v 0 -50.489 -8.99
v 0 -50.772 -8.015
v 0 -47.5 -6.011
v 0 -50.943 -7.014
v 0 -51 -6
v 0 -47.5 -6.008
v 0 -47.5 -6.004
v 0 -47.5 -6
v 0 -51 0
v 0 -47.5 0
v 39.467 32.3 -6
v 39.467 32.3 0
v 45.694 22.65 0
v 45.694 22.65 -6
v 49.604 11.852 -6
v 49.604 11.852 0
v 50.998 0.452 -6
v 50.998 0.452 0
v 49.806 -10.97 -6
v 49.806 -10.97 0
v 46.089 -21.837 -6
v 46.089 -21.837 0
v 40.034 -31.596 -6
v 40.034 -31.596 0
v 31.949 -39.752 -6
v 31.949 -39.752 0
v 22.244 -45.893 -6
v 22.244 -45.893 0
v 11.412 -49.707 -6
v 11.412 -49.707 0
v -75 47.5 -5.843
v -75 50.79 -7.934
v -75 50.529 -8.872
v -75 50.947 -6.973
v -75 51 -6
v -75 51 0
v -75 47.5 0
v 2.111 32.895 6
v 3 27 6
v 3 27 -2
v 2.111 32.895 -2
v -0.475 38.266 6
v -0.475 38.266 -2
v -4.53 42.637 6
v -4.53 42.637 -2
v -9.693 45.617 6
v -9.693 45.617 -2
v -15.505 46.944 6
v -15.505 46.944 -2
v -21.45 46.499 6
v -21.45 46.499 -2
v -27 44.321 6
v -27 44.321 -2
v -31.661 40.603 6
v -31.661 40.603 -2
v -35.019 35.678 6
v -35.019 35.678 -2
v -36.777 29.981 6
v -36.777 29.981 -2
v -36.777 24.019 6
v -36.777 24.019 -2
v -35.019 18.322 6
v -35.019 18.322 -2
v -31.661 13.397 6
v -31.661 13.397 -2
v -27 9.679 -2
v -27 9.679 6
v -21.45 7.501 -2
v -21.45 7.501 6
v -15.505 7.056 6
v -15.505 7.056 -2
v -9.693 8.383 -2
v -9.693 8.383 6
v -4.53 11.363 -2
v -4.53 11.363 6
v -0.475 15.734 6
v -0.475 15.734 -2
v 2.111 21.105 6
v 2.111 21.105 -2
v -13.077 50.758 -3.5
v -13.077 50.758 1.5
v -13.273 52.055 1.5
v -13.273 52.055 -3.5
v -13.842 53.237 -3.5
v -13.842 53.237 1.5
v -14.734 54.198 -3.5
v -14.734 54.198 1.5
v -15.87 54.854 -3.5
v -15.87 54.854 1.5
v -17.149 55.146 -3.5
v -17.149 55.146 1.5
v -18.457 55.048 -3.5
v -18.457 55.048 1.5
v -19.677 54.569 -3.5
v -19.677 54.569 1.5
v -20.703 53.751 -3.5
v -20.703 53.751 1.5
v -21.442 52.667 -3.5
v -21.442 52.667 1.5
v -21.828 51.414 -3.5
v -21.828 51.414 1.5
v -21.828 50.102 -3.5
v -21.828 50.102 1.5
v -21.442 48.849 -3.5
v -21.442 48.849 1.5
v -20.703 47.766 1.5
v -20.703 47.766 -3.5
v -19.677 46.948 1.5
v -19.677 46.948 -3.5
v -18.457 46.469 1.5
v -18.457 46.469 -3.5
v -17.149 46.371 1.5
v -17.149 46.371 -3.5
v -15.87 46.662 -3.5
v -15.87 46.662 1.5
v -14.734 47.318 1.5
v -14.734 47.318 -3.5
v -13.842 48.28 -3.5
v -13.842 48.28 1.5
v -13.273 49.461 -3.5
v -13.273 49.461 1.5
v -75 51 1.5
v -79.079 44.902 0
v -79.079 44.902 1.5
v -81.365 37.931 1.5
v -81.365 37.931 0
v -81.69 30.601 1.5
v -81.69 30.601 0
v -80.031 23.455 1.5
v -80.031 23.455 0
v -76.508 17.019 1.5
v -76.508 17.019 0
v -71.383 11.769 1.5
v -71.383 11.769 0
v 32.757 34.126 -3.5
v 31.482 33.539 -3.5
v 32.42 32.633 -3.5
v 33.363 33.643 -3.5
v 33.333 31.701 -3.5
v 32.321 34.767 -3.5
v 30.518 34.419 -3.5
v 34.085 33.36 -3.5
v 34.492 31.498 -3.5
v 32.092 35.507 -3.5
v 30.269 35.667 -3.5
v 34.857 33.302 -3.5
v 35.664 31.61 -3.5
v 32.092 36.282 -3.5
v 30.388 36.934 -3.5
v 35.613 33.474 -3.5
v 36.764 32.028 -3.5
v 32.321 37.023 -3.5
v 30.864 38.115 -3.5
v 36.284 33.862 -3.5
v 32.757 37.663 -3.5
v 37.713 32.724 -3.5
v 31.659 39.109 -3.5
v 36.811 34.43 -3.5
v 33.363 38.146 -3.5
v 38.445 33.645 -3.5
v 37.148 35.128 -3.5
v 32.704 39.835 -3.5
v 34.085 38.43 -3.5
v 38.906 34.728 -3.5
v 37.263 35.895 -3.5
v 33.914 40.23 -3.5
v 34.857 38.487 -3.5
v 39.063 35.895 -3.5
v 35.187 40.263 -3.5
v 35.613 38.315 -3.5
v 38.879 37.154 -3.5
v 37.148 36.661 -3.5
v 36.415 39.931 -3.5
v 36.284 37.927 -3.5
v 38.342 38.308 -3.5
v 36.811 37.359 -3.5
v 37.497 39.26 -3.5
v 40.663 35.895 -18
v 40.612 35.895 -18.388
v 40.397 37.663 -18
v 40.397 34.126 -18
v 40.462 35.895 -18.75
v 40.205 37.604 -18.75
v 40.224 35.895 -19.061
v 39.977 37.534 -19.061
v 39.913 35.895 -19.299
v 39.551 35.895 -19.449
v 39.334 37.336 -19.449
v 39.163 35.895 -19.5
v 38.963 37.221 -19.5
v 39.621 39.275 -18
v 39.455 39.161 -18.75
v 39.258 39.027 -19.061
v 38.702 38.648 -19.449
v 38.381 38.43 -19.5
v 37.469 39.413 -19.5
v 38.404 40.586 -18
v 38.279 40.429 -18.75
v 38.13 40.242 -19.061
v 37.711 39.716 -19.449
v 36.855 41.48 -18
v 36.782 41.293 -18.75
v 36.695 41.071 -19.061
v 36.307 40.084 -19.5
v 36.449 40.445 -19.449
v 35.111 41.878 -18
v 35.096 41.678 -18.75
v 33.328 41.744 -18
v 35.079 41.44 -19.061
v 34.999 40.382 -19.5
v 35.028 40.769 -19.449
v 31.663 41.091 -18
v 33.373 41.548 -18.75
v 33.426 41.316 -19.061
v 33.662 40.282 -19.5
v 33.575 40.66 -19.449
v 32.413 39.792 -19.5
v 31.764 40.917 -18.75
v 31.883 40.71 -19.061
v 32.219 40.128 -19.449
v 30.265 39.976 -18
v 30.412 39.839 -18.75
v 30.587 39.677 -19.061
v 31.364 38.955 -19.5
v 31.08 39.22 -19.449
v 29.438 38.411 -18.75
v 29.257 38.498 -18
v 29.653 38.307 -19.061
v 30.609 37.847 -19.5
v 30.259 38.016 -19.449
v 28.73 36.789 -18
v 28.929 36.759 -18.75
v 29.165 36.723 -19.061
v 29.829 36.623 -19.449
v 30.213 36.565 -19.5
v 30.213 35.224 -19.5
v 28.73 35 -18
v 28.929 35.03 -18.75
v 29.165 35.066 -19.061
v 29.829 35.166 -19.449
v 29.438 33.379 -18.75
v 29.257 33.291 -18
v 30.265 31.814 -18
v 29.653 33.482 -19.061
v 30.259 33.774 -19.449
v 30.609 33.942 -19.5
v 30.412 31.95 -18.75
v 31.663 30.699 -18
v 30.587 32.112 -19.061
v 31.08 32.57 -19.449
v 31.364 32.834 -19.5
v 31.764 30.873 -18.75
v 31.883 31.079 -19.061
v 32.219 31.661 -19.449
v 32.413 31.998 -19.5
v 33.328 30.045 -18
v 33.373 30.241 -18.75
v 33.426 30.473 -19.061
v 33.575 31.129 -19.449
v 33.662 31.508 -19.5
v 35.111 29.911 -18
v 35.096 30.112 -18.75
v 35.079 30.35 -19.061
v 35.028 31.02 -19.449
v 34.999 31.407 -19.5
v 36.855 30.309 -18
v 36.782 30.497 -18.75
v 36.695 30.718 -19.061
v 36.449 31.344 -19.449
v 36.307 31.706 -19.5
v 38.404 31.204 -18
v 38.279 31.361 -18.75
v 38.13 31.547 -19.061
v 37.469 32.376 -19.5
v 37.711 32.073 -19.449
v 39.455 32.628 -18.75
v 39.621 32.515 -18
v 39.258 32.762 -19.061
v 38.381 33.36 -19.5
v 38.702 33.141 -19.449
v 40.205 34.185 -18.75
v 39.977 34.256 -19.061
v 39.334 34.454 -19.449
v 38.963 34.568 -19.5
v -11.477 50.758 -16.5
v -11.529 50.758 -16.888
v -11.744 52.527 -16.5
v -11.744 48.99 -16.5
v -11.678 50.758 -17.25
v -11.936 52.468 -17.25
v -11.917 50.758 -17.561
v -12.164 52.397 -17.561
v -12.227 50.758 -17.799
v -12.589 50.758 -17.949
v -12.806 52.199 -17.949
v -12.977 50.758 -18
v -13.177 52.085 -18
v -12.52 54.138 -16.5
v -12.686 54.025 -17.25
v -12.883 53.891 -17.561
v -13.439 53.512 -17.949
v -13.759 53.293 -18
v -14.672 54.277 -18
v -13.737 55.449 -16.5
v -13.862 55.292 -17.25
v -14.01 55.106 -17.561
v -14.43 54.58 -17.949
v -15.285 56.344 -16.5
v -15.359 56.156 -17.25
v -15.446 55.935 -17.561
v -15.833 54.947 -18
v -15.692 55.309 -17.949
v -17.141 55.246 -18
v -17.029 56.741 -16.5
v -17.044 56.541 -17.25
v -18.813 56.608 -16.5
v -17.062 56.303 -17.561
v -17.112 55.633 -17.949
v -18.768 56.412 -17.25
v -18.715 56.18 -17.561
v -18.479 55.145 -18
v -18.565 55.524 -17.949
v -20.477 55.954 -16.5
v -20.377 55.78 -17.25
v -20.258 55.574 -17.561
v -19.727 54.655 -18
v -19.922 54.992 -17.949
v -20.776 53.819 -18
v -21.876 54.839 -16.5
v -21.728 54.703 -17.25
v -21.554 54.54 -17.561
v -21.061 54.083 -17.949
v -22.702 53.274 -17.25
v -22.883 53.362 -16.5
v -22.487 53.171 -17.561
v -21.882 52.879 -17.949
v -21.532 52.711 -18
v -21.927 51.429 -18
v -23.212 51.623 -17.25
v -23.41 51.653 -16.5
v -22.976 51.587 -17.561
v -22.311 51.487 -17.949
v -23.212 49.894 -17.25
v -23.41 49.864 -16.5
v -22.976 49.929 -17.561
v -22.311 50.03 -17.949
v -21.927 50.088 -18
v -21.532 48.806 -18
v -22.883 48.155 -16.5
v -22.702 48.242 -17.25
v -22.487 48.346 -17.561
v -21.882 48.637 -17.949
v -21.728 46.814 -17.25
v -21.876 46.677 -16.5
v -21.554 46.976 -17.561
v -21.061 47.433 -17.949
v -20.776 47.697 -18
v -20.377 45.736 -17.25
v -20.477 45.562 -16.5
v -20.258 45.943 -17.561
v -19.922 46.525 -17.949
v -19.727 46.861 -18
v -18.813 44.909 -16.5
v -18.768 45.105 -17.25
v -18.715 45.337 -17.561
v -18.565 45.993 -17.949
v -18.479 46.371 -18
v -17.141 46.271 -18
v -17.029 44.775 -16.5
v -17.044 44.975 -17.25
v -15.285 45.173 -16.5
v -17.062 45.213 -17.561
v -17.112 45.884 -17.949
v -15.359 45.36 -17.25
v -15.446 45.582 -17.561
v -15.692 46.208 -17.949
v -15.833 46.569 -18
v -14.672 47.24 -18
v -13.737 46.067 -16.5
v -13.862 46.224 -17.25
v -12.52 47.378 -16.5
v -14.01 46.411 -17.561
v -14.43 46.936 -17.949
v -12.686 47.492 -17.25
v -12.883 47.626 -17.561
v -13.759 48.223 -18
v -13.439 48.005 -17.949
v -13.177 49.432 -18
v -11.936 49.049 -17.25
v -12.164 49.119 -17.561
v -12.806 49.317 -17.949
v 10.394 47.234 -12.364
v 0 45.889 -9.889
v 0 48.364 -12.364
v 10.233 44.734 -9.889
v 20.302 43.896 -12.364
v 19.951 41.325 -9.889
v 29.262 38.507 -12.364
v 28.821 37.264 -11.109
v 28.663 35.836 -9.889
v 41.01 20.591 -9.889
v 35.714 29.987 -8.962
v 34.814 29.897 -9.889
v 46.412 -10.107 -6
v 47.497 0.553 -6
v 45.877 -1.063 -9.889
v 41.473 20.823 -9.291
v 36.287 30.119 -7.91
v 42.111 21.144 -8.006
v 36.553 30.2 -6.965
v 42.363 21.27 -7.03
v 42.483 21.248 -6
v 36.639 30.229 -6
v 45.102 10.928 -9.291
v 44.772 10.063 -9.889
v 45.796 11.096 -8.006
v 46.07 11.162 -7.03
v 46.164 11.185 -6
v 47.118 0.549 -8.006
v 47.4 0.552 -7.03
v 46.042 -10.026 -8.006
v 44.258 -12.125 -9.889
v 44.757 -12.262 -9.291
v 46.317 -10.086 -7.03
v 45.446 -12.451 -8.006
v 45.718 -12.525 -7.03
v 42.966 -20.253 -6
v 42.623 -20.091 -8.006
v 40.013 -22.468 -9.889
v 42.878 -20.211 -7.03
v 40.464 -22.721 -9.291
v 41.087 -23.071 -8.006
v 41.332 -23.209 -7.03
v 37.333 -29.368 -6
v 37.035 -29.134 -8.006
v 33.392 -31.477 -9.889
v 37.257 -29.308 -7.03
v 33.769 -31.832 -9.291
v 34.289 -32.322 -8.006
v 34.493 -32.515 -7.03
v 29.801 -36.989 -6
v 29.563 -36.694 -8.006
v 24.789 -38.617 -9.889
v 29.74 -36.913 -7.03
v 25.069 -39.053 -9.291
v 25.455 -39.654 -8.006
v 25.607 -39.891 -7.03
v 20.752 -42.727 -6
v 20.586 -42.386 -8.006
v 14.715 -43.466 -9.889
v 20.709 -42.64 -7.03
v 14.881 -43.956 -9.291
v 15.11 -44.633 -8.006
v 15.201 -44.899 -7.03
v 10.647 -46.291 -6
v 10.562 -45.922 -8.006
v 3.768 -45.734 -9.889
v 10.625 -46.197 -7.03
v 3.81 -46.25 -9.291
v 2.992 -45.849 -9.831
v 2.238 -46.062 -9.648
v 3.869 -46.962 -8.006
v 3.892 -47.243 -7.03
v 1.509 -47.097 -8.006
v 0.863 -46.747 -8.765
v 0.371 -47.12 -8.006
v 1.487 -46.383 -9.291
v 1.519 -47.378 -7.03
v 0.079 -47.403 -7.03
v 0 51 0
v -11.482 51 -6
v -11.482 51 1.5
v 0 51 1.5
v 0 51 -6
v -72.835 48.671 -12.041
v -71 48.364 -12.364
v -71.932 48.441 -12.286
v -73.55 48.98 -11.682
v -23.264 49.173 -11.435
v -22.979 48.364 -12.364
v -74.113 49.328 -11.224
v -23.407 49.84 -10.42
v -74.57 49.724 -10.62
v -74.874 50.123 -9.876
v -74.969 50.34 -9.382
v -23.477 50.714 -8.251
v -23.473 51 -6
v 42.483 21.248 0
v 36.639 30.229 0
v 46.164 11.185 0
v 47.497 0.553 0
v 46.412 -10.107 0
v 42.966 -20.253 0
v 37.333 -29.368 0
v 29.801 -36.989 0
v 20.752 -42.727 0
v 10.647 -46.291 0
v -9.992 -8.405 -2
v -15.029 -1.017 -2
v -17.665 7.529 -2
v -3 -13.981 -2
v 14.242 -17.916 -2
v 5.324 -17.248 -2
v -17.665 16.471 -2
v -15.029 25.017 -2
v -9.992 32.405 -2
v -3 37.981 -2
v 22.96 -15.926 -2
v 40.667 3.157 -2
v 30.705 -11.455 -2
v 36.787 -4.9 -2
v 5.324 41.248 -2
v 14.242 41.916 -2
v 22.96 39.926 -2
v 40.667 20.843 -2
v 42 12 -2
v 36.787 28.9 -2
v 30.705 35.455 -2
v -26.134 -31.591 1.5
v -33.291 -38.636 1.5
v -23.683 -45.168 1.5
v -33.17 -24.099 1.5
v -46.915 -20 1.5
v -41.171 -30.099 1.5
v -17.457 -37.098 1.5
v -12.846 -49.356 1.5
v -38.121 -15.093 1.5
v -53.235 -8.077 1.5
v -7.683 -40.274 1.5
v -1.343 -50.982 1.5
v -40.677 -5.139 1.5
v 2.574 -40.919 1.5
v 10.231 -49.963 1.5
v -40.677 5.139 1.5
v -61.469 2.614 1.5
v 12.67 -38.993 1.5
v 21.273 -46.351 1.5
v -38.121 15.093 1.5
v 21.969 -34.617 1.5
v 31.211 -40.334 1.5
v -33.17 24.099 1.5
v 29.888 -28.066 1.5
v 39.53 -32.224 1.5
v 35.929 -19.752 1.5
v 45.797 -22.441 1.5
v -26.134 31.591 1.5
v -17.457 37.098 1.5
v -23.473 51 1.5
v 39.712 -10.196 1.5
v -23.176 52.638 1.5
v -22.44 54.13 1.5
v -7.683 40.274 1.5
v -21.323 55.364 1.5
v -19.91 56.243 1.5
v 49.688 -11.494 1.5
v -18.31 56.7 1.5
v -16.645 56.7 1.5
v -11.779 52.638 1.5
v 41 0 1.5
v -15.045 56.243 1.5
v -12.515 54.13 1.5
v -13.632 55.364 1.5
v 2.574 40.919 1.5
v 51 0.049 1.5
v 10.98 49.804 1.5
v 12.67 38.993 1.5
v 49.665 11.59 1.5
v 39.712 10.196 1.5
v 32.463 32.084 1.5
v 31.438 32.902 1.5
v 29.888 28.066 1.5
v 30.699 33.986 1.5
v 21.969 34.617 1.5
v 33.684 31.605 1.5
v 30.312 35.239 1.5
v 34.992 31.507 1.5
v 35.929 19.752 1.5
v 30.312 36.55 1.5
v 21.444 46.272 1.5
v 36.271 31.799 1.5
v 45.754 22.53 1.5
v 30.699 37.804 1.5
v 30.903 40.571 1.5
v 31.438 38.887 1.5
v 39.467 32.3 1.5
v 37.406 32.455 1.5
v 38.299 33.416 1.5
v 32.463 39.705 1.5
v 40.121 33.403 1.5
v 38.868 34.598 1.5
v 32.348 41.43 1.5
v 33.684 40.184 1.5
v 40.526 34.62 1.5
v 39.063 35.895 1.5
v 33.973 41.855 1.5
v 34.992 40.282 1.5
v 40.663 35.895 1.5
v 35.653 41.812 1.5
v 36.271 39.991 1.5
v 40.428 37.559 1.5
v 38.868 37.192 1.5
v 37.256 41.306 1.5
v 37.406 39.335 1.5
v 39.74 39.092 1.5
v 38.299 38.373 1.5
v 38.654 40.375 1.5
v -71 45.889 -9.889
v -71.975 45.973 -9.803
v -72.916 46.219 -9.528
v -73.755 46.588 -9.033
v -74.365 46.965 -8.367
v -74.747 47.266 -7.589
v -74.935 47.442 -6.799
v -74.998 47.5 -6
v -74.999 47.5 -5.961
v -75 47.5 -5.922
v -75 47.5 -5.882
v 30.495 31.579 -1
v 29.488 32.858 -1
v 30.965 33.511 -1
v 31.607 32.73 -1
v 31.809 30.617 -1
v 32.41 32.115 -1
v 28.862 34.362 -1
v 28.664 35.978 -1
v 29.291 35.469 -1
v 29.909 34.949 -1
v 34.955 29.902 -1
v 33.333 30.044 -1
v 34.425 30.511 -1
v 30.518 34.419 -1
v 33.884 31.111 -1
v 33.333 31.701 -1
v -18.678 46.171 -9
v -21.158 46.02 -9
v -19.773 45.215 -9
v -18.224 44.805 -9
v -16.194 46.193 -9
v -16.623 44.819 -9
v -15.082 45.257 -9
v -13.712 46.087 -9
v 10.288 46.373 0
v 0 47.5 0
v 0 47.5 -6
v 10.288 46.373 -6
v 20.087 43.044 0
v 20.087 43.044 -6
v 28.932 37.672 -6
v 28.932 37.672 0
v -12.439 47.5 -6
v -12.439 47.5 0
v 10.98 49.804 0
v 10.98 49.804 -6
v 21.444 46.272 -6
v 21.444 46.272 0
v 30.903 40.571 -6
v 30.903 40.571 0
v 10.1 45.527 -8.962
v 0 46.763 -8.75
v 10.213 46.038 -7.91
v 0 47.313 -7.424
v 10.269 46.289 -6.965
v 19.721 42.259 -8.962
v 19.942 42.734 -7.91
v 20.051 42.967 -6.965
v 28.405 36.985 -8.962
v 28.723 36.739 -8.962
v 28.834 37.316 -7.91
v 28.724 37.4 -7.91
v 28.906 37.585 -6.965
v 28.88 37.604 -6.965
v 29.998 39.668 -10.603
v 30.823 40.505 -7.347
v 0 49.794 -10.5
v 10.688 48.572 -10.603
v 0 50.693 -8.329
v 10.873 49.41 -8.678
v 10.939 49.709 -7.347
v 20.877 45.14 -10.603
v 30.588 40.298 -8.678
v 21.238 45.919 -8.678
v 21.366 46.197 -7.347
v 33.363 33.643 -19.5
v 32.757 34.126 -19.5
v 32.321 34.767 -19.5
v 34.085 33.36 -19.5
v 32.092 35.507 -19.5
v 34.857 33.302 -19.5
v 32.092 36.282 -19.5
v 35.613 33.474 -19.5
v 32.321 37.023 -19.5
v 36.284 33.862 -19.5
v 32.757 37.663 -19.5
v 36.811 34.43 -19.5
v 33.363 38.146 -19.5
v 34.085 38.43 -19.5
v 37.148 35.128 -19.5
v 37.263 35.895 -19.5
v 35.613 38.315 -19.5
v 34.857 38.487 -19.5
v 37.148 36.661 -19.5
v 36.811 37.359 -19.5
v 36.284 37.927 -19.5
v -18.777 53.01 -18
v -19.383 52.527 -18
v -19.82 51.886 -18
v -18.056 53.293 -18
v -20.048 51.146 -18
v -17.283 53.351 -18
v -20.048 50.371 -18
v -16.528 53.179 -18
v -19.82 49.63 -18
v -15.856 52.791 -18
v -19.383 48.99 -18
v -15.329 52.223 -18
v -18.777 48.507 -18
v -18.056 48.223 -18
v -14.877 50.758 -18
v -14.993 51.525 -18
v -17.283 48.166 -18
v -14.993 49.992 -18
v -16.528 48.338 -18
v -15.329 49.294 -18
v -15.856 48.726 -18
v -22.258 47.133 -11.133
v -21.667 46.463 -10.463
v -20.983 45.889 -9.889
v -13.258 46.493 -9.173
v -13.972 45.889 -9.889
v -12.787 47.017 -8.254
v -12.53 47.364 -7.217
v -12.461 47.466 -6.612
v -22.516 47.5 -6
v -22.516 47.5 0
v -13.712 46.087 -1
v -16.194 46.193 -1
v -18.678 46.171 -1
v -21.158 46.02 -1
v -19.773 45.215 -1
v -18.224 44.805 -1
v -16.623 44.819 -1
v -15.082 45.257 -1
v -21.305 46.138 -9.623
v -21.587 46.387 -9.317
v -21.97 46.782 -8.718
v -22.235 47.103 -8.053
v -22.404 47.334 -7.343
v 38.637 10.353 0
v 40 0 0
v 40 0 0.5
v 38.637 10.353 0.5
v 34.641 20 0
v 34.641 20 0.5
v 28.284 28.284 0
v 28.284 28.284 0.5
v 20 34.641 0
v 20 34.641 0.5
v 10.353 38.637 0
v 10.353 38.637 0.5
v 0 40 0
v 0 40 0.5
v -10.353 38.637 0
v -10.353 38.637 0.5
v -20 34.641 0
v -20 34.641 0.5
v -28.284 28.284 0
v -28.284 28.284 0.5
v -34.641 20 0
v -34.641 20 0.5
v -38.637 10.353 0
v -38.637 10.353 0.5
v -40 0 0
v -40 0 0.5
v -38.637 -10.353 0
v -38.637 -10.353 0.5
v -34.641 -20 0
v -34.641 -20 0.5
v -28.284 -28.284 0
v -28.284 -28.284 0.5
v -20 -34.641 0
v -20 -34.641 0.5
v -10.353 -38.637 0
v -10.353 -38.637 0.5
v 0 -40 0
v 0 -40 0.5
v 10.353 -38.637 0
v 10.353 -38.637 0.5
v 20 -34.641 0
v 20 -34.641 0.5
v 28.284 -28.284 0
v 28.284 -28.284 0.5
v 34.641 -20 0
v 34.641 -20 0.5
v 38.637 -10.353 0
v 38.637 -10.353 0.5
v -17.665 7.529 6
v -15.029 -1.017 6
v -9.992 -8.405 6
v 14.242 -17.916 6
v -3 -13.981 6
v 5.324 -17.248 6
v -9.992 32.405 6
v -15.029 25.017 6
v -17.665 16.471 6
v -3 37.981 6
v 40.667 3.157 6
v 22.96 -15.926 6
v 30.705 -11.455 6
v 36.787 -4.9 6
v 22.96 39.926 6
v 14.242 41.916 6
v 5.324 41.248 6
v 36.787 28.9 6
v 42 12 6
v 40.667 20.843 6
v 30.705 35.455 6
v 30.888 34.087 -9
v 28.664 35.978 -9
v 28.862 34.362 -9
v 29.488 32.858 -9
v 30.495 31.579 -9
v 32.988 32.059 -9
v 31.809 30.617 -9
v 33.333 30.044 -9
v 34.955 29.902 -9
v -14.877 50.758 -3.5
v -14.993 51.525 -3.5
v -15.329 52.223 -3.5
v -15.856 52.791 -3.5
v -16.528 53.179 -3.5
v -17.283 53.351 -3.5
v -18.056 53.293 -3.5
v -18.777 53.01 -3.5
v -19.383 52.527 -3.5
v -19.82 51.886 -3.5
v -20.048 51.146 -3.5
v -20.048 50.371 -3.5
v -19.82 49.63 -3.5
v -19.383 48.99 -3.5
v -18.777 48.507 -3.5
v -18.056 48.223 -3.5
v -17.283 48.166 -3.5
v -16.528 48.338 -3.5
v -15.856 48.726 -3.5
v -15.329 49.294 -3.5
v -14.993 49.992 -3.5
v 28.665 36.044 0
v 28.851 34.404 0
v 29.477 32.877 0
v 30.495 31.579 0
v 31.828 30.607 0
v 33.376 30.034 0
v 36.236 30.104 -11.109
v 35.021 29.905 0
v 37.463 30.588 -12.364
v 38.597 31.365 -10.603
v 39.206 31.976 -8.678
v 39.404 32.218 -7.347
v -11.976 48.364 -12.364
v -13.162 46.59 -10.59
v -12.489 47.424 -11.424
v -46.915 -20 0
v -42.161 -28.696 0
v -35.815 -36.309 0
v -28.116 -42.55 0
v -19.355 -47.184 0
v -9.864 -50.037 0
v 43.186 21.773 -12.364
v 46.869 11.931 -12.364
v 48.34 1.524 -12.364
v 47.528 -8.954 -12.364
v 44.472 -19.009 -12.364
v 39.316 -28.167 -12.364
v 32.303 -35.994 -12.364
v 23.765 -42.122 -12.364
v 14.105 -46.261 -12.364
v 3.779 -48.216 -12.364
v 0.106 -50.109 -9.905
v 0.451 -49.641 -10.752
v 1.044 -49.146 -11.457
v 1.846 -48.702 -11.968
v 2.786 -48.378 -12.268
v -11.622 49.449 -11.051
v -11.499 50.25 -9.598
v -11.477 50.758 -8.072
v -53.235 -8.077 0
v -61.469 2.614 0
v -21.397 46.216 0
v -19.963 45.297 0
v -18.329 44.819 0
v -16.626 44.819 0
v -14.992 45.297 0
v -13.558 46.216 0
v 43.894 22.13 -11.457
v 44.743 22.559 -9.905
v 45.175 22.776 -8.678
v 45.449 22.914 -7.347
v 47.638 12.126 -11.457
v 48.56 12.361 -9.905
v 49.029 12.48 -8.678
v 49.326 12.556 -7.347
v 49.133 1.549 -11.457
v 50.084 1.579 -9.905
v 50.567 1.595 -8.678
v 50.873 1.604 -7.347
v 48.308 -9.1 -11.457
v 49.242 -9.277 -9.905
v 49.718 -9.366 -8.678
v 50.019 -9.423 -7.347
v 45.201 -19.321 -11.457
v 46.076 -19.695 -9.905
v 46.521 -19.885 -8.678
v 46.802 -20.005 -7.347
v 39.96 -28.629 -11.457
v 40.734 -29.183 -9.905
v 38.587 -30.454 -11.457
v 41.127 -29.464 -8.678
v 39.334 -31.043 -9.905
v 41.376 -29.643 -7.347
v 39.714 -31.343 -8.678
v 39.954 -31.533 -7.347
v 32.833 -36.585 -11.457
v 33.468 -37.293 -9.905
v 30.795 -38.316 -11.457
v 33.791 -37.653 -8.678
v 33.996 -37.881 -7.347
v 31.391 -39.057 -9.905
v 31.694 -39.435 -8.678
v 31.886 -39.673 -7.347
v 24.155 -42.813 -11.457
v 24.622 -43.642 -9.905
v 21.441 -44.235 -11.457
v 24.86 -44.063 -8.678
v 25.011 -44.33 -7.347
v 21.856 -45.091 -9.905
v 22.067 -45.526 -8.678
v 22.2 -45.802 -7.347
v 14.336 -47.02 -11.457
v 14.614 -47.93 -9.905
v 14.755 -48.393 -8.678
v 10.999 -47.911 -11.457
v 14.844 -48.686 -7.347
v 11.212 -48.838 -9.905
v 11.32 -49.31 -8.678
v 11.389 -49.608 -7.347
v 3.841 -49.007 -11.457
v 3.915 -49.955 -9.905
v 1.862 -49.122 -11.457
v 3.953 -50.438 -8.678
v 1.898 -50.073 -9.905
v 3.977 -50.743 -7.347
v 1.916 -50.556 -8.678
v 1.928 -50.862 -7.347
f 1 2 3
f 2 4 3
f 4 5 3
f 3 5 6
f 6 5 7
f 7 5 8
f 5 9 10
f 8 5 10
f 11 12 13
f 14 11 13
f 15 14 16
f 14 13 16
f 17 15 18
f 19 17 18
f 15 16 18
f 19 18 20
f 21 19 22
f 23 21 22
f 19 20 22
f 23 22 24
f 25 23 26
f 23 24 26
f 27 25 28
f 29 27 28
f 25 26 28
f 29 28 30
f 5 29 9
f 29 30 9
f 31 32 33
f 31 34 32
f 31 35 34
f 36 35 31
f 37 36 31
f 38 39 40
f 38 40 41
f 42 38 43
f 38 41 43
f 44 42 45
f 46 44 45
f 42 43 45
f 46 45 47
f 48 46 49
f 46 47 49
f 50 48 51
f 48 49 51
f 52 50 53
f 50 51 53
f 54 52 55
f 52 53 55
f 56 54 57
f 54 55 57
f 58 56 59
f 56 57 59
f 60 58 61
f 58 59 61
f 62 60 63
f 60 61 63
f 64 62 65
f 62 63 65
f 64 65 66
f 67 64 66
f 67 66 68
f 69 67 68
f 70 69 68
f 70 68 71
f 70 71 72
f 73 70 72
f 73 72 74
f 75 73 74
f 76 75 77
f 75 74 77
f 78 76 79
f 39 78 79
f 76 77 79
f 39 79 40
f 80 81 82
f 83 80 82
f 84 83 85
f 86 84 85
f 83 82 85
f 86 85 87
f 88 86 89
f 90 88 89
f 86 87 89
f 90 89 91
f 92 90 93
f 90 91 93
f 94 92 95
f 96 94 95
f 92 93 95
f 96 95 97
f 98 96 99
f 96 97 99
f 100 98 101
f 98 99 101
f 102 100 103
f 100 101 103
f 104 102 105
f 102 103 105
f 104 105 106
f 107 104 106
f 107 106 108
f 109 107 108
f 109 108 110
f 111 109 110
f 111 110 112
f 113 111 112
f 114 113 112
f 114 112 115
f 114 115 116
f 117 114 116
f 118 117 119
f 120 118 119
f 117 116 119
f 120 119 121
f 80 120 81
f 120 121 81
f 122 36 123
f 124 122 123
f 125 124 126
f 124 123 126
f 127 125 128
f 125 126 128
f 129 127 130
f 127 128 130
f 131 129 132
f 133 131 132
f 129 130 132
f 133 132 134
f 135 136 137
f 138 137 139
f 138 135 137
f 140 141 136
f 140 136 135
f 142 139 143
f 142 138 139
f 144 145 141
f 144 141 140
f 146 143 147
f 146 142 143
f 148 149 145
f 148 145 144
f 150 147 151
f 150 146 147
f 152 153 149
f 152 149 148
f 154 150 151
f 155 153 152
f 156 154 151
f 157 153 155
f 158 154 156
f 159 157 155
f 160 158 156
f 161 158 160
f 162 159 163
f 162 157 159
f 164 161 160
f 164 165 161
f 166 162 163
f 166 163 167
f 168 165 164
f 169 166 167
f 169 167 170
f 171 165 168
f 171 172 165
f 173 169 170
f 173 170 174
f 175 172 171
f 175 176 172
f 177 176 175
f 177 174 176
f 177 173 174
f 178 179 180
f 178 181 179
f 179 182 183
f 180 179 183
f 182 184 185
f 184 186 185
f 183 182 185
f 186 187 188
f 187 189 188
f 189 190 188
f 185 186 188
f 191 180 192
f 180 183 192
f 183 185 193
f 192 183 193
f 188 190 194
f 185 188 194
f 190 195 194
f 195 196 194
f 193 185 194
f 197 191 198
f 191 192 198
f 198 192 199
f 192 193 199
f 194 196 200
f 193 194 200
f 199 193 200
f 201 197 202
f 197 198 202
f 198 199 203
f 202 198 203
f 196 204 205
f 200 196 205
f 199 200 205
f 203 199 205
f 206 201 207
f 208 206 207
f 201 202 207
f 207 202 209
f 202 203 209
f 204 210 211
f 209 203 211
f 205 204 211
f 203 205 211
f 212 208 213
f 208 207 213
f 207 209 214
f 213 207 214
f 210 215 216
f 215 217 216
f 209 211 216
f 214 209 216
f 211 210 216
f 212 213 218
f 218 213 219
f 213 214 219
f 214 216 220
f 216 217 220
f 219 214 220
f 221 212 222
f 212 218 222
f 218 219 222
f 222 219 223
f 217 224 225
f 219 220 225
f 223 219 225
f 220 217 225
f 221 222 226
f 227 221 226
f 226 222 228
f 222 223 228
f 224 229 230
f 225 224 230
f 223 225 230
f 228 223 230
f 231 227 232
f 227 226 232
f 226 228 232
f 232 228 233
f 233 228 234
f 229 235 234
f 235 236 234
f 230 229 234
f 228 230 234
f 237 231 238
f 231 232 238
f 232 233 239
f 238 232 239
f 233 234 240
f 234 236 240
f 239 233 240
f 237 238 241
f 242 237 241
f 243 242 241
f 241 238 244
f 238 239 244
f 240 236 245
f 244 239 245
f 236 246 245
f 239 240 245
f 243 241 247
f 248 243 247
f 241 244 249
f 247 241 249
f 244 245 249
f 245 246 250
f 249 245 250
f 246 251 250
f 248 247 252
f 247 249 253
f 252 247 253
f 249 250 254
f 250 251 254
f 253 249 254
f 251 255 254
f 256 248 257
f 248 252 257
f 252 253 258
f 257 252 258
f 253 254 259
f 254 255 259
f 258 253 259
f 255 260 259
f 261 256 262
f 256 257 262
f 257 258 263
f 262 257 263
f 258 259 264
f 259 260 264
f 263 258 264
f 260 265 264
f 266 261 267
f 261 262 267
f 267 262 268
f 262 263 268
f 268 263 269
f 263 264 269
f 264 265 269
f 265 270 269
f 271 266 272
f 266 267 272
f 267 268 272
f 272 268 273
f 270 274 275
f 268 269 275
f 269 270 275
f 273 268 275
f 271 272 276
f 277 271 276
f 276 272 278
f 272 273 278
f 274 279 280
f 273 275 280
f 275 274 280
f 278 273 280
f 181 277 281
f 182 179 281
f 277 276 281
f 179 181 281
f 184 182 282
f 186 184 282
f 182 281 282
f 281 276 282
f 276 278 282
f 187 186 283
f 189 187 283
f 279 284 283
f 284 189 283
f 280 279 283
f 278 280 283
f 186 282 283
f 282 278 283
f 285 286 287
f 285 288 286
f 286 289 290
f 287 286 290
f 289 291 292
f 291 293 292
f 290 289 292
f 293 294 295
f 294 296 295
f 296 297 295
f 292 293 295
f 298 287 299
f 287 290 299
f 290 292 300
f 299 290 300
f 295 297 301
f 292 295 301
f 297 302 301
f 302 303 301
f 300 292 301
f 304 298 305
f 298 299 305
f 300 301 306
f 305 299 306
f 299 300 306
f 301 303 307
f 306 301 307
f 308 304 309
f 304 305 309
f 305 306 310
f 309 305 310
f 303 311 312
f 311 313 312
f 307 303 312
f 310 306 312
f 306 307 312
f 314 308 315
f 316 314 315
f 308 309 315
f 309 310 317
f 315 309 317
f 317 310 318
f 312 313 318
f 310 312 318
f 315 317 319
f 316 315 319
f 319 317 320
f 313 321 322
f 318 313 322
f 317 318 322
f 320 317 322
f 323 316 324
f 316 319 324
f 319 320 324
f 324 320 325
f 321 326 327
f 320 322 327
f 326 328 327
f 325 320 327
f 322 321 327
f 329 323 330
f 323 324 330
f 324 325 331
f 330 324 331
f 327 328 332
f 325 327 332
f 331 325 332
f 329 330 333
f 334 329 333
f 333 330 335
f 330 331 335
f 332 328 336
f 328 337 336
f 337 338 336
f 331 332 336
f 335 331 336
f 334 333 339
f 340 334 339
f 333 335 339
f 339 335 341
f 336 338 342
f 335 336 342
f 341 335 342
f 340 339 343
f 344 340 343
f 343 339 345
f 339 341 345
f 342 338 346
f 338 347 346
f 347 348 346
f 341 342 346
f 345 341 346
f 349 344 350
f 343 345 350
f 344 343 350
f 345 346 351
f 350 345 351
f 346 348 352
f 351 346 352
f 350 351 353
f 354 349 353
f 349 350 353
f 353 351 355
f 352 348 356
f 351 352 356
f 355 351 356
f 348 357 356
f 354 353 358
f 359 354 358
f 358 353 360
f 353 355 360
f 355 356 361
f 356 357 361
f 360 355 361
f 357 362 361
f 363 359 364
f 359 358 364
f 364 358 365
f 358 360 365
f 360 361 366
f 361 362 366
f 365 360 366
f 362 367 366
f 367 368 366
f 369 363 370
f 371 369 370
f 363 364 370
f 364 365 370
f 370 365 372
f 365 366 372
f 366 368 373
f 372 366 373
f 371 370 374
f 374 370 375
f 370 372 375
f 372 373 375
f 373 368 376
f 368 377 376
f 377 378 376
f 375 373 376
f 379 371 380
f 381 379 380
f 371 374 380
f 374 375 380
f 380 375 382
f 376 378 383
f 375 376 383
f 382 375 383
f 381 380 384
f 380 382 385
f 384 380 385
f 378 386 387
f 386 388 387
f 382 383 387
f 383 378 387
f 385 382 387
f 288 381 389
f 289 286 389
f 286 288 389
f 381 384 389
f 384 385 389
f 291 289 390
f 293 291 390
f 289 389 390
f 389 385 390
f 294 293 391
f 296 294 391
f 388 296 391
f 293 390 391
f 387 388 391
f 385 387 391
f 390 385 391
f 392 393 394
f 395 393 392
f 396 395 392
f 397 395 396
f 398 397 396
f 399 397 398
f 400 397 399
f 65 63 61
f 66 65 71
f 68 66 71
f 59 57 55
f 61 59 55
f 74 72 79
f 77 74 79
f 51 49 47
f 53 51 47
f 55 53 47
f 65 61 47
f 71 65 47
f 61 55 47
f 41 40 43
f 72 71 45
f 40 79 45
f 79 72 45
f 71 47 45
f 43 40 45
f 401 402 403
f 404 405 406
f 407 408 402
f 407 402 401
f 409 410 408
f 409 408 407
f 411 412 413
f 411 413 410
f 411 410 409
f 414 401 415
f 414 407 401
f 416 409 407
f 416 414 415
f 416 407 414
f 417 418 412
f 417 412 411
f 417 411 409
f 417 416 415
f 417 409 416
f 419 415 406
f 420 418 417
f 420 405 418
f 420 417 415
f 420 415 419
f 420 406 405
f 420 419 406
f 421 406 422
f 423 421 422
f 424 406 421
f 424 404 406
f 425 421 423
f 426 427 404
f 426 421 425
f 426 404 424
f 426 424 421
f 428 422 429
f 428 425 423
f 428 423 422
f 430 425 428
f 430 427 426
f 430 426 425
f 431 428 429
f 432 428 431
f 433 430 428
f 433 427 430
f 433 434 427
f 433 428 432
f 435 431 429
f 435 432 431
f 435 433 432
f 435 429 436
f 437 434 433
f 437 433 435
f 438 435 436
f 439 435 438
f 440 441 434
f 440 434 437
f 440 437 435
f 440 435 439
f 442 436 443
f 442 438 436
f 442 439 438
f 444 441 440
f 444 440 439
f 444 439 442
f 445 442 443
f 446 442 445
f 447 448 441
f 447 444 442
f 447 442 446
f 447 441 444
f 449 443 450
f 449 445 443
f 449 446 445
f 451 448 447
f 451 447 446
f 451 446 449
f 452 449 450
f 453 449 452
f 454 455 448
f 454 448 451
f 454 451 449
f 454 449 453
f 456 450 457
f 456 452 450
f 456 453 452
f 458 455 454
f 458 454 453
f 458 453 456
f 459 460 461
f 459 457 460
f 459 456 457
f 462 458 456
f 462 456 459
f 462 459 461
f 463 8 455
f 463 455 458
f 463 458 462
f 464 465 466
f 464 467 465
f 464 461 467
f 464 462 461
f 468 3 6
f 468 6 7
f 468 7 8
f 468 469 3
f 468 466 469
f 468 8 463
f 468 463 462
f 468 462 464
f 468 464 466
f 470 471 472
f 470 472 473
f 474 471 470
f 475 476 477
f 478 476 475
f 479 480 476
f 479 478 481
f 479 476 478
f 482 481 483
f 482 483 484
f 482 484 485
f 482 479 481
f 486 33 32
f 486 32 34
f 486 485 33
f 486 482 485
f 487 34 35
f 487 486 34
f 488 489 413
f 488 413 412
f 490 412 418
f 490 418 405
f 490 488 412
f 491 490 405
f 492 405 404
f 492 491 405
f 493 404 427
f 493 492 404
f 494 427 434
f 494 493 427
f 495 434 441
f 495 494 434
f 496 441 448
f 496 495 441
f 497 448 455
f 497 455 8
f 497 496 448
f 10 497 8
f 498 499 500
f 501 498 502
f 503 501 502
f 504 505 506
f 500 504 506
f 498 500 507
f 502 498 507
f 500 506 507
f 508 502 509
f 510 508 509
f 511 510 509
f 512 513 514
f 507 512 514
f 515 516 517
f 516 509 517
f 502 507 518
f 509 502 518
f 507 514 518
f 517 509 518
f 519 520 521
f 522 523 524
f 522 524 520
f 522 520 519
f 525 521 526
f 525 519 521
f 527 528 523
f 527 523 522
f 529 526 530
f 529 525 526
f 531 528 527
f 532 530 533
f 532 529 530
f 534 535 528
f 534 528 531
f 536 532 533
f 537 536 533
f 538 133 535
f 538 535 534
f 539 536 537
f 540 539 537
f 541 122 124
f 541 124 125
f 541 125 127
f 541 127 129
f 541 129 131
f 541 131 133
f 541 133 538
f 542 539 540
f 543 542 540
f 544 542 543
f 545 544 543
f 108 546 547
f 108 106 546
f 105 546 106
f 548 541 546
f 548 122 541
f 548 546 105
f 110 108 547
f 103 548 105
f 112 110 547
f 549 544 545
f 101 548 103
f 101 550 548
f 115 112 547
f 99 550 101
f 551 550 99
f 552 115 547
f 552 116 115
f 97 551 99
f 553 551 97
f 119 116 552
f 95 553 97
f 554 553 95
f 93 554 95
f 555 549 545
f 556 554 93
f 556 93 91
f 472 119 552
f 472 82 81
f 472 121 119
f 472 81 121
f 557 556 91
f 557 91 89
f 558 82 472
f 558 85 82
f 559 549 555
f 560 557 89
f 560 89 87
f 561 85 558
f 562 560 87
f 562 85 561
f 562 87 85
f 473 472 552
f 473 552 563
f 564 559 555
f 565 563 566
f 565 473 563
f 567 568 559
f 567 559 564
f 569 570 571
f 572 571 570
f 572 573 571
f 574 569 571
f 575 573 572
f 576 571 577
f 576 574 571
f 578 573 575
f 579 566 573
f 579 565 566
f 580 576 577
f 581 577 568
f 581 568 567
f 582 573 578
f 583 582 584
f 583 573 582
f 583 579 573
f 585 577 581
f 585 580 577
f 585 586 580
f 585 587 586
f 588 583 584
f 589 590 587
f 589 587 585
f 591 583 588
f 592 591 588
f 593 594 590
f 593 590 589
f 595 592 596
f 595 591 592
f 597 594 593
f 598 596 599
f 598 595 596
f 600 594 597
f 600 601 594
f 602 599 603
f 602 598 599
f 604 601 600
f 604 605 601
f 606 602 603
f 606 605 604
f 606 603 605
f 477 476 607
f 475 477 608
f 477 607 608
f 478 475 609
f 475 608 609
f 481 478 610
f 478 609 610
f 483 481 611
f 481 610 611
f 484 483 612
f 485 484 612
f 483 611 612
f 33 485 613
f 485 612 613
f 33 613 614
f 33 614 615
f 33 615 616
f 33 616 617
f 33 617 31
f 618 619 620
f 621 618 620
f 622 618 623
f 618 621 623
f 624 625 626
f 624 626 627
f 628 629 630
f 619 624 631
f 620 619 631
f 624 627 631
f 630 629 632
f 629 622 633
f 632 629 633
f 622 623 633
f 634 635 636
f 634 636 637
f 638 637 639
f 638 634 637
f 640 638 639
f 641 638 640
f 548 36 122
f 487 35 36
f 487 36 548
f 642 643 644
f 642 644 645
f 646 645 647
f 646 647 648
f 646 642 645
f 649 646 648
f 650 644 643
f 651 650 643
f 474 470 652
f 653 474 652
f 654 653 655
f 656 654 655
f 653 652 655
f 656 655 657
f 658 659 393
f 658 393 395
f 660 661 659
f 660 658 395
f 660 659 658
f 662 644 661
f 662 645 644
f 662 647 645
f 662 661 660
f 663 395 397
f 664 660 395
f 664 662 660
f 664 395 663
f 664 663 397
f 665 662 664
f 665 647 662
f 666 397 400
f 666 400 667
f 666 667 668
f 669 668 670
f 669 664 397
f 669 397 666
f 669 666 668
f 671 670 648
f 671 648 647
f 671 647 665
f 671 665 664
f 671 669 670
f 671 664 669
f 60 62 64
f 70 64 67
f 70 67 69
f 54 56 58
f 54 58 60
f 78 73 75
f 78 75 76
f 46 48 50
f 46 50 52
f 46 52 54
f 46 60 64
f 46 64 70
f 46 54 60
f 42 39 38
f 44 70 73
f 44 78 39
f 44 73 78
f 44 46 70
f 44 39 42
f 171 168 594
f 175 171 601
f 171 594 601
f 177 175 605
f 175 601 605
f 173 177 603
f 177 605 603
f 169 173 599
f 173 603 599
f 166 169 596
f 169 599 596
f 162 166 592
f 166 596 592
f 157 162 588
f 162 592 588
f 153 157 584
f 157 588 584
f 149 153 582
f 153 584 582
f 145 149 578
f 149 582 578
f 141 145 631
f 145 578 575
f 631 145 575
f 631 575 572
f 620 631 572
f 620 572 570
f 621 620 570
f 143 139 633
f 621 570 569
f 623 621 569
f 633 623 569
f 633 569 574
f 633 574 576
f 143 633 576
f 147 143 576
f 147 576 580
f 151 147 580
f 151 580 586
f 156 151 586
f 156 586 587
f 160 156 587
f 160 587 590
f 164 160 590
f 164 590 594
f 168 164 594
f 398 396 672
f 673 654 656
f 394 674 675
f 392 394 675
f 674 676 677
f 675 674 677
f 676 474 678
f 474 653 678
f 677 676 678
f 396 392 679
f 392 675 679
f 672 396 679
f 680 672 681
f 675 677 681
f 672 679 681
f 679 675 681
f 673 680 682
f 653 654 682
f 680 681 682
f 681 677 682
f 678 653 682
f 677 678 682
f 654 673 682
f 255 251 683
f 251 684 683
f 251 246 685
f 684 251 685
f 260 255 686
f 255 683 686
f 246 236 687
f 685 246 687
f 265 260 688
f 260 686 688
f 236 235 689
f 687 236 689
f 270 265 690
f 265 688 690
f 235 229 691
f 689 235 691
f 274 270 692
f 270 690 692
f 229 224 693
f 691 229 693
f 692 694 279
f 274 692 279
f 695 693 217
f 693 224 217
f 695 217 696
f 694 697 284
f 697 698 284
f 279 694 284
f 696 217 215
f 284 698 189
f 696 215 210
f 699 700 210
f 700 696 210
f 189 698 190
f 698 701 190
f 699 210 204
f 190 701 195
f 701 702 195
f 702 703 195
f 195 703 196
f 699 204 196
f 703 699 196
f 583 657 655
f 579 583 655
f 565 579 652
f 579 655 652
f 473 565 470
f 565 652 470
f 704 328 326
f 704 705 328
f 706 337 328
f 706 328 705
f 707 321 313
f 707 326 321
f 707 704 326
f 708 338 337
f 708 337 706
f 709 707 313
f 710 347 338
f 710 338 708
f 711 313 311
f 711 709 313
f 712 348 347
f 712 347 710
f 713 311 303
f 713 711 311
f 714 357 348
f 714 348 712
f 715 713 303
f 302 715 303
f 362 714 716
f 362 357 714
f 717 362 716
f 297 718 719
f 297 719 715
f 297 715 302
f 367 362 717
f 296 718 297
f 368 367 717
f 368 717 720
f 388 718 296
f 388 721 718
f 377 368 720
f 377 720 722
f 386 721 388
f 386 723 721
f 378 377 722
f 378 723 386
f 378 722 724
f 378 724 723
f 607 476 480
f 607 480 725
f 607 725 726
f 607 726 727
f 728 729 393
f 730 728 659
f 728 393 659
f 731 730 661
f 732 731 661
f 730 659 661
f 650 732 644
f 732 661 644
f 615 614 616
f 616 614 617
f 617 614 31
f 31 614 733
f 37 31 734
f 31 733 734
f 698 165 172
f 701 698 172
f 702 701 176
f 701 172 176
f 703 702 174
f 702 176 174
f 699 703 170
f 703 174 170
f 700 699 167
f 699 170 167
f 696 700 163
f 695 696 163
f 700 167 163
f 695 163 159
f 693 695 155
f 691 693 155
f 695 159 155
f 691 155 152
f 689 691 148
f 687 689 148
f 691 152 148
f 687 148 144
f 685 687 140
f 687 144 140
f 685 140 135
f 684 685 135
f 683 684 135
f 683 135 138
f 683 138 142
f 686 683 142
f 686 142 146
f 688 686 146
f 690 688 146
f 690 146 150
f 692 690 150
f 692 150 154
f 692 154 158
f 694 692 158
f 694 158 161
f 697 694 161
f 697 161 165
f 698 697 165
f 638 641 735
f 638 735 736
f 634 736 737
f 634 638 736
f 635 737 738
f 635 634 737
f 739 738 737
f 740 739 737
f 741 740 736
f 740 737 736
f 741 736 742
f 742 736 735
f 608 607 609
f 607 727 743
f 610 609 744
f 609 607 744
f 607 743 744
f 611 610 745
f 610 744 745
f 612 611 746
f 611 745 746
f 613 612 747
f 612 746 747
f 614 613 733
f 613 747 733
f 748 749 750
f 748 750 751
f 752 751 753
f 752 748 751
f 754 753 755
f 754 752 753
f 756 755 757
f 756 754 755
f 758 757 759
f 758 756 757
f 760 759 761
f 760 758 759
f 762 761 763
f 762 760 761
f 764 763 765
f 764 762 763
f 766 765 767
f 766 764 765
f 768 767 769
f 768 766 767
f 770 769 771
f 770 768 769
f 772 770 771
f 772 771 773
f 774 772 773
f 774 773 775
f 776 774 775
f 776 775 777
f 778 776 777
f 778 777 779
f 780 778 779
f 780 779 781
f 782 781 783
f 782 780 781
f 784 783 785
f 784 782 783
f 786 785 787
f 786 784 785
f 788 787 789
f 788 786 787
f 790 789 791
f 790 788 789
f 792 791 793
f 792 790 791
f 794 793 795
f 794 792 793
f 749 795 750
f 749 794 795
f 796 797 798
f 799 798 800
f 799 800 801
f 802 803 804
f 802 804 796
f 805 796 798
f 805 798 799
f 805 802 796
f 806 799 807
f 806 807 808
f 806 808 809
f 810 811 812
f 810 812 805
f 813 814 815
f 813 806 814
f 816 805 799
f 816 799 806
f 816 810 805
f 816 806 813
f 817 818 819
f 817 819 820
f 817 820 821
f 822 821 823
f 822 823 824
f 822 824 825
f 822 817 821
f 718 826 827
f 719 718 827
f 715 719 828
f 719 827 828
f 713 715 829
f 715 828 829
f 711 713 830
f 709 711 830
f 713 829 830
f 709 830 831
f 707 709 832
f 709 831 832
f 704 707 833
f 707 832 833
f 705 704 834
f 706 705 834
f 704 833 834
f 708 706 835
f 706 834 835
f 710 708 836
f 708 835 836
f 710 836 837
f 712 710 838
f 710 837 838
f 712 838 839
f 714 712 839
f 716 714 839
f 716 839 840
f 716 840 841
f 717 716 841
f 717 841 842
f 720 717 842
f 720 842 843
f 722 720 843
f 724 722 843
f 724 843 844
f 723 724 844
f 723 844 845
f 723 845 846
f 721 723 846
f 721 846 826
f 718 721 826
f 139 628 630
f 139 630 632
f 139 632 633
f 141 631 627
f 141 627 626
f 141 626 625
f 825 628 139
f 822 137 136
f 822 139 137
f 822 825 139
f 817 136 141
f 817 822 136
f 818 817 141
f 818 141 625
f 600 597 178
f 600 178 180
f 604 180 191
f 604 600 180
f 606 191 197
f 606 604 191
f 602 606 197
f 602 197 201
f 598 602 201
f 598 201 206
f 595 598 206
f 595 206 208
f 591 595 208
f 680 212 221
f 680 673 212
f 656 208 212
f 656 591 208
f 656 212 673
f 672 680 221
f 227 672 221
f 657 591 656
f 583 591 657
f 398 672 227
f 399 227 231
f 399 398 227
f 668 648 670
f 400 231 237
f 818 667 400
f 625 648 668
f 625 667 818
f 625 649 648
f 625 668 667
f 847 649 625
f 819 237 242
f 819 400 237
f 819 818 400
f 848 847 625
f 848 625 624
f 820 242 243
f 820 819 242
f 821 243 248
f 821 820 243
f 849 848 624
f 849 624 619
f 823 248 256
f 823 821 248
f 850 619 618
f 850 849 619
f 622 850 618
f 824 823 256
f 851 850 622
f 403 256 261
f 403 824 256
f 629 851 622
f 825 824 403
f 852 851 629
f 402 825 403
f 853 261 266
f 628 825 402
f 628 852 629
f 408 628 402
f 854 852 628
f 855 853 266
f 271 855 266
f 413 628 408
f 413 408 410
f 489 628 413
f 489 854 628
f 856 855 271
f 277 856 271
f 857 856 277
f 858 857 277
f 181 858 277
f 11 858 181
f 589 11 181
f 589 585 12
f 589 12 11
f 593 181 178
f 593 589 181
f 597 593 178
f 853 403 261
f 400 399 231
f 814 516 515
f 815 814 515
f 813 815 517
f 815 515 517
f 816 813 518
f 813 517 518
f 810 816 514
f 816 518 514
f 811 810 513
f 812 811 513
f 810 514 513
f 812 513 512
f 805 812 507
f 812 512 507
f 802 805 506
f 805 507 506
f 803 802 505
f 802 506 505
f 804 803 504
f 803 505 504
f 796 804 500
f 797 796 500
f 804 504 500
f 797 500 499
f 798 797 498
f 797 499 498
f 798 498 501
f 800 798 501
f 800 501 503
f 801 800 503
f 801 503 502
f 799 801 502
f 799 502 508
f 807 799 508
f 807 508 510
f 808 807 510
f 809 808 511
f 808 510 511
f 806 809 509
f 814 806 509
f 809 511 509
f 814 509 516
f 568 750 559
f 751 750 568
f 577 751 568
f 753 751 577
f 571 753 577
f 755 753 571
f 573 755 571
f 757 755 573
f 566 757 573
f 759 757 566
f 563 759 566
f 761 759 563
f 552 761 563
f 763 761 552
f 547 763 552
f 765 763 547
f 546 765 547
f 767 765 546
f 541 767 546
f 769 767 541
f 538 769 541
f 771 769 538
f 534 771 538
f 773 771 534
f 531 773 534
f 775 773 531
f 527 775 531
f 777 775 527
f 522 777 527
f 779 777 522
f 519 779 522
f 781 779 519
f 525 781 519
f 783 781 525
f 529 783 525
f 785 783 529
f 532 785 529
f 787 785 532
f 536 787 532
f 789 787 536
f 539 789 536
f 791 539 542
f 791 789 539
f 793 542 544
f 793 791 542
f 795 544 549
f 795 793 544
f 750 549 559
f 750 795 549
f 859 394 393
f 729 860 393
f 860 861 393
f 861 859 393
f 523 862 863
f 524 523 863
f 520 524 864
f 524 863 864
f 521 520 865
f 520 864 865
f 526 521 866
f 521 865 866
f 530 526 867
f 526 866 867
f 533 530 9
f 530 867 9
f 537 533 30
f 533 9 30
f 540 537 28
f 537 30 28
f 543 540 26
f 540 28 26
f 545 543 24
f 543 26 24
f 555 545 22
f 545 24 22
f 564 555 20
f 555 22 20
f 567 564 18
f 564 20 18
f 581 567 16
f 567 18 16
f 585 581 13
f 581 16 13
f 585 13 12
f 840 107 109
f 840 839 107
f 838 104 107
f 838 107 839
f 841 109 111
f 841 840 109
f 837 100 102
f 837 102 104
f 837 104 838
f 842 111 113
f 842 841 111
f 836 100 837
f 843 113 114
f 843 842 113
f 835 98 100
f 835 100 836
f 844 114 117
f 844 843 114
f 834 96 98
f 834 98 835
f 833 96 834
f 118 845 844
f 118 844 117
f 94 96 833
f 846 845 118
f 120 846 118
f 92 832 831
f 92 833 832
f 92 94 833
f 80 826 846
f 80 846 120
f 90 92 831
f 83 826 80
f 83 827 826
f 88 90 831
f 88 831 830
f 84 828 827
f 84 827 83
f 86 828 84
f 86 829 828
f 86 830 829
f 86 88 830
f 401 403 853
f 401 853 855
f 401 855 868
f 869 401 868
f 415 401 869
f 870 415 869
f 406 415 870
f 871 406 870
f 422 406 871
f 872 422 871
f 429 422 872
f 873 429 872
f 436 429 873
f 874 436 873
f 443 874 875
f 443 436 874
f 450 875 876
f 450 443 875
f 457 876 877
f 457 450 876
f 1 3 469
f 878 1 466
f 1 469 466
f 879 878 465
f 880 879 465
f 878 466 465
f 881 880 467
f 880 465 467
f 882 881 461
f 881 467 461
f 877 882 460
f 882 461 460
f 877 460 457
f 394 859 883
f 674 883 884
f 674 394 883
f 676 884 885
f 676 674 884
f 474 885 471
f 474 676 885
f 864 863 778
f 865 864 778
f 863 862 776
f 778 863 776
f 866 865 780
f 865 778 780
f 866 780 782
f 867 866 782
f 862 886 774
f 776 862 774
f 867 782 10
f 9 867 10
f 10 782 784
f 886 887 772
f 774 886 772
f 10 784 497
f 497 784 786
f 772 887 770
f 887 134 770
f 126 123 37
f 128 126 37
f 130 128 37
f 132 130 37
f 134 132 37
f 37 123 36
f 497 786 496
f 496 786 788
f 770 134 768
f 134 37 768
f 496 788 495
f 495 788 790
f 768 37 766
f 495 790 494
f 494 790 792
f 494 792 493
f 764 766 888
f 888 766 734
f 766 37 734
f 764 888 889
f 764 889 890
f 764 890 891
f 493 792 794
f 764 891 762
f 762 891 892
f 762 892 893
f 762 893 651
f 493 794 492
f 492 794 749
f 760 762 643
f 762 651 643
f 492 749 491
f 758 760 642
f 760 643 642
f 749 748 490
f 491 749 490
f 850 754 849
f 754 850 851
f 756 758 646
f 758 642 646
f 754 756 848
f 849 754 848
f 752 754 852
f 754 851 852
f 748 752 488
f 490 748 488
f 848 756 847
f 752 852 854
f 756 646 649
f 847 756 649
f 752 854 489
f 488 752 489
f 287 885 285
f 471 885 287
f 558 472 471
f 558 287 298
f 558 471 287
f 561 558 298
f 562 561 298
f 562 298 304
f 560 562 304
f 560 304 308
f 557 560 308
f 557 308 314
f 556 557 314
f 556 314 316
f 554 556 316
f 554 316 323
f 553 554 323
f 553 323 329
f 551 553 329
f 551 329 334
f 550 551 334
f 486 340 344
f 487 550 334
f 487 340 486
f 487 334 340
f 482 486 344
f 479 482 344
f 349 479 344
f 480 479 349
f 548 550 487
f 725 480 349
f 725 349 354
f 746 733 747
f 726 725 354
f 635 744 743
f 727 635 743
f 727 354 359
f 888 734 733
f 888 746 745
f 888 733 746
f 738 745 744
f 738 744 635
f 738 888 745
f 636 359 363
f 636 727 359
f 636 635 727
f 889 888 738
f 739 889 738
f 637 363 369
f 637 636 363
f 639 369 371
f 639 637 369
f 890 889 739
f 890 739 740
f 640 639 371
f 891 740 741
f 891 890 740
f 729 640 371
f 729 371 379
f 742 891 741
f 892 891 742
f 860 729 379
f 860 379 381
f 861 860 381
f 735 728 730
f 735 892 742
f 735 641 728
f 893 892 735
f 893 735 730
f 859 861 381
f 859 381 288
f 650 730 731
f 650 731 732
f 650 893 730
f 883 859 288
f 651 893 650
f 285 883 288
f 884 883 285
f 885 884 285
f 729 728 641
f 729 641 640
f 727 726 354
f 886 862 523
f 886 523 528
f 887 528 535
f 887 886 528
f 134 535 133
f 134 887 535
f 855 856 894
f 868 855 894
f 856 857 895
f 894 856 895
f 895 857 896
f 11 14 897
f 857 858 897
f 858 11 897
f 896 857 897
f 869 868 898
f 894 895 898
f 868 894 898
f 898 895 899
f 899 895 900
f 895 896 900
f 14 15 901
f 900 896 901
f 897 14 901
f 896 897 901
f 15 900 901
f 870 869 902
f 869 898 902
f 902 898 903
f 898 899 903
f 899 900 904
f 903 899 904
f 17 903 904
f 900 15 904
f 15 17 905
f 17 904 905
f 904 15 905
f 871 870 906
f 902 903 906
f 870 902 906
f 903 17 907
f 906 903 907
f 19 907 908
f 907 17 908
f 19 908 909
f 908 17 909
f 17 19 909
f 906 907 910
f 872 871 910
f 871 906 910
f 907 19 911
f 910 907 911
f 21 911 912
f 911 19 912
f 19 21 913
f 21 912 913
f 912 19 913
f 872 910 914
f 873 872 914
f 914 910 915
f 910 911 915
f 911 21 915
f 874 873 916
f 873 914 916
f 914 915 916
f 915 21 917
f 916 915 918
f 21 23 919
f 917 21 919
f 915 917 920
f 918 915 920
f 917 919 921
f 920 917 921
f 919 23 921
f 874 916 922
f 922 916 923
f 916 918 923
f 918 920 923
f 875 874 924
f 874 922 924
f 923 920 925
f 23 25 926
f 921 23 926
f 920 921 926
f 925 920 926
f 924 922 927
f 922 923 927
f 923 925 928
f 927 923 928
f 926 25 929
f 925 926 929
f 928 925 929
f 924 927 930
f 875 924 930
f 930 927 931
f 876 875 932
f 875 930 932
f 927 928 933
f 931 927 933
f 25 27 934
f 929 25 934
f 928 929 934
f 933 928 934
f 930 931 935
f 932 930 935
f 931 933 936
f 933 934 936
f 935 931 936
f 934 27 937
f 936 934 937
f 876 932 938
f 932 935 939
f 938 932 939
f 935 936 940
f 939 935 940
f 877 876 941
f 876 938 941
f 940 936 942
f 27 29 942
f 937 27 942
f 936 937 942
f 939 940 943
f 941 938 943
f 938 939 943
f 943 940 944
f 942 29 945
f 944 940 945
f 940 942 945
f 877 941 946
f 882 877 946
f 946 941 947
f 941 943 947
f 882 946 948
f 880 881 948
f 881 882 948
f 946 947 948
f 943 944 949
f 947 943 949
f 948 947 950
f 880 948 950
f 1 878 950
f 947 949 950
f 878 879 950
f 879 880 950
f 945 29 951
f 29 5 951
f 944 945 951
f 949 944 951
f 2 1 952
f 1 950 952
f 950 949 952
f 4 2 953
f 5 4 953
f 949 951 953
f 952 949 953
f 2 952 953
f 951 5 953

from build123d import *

# Parameters (mm, degrees)
CYLINDER002_R     = 20
CYLINDER002_DEPTH = 8
CYLINDER003_R     = 30
CYLINDER003_DEPTH = 8
CYLINDER004_R     = 48
CYLINDER004_DEPTH = 8
CYLINDER_R        = 46
CYLINDER_DEPTH    = 8
REVOLUTION_ANGLE  = -180
SKETCH_R          = 40
PAD_DEPTH         = 1.5
PAD001_DEPTH      = 75
SKETCH005_R       = 6
PAD002_DEPTH      = 21
SKETCH012_R       = 2.6
POCKET_DEPTH      = 21.001
SKETCH013_R       = 4.4
POCKET001_DEPTH   = 5
SKETCH008_W       = 35.7258
SKETCH008_H       = 35.7258
POCKET002_DEPTH   = 1.5
CHAMFER_SIZE      = 1
FILLET_R          = 1.5
FILLET001_R       = 4


with BuildPart() as cylinder002:
    # Cylinder002 → Cylinder002 (new body)
    with BuildSketch(Plane(origin=(-17, 27, -2), x_dir=(1, 0, 0), z_dir=(0, 0, 1))):
        Circle(CYLINDER002_R)
    extrude(amount=CYLINDER002_DEPTH)


with BuildPart() as cylinder003:
    # Cylinder003 → Cylinder003 (new body)
    with BuildSketch(Plane(origin=(12, 12, -2), x_dir=(1, 0, 0), z_dir=(0, 0, 1))):
        Circle(CYLINDER003_R)
    extrude(amount=CYLINDER003_DEPTH)


with BuildPart() as cylinder004:
    # Cylinder004 → Cylinder004 (new body)
    with BuildSketch(Plane(origin=(-17, -1.8, -9), x_dir=(1, 0, 0), z_dir=(0, 0, 1))):
        Circle(CYLINDER004_R)
    extrude(amount=CYLINDER004_DEPTH)


with BuildPart() as cylinder:
    # Cylinder → Cylinder (new body)
    with BuildSketch(Plane.XY.offset(-9)):
        Circle(CYLINDER_R)
    extrude(amount=CYLINDER_DEPTH)


with BuildPart() as revolution:
    # Sketch004 → Revolution (revolve)
    with BuildSketch(Plane.YZ):
        with BuildLine():
            Line((48.363961, -12.363961), (45.889087, -9.889088))
            ThreePointArc((45.889087, -9.889088), (47.081337, -8.104759), (47.5, -6))
            Line((47.5, -6), (47.5, 0))
            Line((47.5, 0), (51, 0))
            Line((51, -6), (51, 0))
            ThreePointArc((48.363961, -12.363961), (50.314916, -9.444151), (51, -6))
        make_face()
    revolve(axis=Axis((0, 0, 0), (0, 0, 1)), revolution_arc=REVOLUTION_ANGLE)


with BuildPart() as pad:
    # Sketch → Pad (new body)
    with BuildSketch(Plane.XY):
        with BuildLine():
            ThreePointArc((-46.914816, -20), (42.549971, -28.115832), (0, 51))
            Line((-75, 51), (0, 51))
            ThreePointArc((-75, 51), (-81.690324, 30.60121), (-71.383422, 11.769352))
            ThreePointArc((-46.914816, -20), (-57.126294, -2.557354), (-71.383422, 11.769352))
        make_face()
        Circle(SKETCH_R, mode=Mode.SUBTRACT)
    extrude(amount=PAD_DEPTH)


with BuildPart() as fillet001:
    # Sketch009 → Pad001 (new body)
    with BuildSketch(Plane.YZ):
        with BuildLine():
            Line((48.363961, -12.363961), (45.889087, -9.889088))
            ThreePointArc((45.889087, -9.889088), (47.081337, -8.104759), (47.5, -6))
            Line((47.5, -6), (47.5, 0))
            Line((47.5, 0), (51, 0))
            Line((51, -6), (51, 0))
            ThreePointArc((48.363961, -12.363961), (50.314916, -9.444151), (51, -6))
        make_face()
    extrude(amount=-PAD001_DEPTH)

    # Fusion: union Revolution, Pad
    add(revolution.part)
    add(pad.part)

    # Sketch005 → Pad002 (new body)
    with BuildSketch(Plane.XY.offset(1.5)):
        with Locations((-17.477472, 50.758264)):
            Circle(SKETCH005_R)
        with Locations((34.663114, 35.894705)):
            Circle(SKETCH005_R)
    extrude(amount=-PAD002_DEPTH)

    # Sketch012 → Pocket (cut, through all)
    with BuildSketch(Plane.XY.offset(1.5)):
        with Locations((-17.477472, 50.758264)):
            Circle(SKETCH012_R)
        with Locations((34.663114, 35.894705)):
            Circle(SKETCH012_R)
    extrude(amount=-POCKET_DEPTH, mode=Mode.SUBTRACT)

    # Sketch013 → Pocket001 (cut)
    with BuildSketch(Plane.XY.offset(1.5)):
        with Locations((-17.477472, 50.758264)):
            Circle(SKETCH013_R)
        with Locations((34.663114, 35.894705)):
            Circle(SKETCH013_R)
    extrude(amount=-POCKET001_DEPTH, mode=Mode.SUBTRACT)

    # Sketch008 → Pocket002 (cut)
    with BuildSketch(Plane(origin=(0, 0, -19.5), x_dir=(1, 0, 0), z_dir=(0, 0, -1))):
        with Locations((-17.8629, -50.7062)):
            Rectangle(SKETCH008_W, SKETCH008_H)
    extrude(amount=-POCKET002_DEPTH, mode=Mode.SUBTRACT)

    # Cut: cut Cylinder
    add(cylinder.part, mode=Mode.SUBTRACT)

    # Cut001: cut Cylinder004
    add(cylinder004.part, mode=Mode.SUBTRACT)

    # Chamfer
    chamfer_edges = [fillet001.edges().sort_by_distance(p)[0] for p in [
        (-40, 0, 1.5),
    ]]
    chamfer(chamfer_edges, length=CHAMFER_SIZE)

    # Fillet
    fillet_edges = [fillet001.edges().sort_by_distance(p)[0] for p in [
        (28.663114, 35.894705, -19.5),
        (-23.477472, 50.758264, -18),
    ]]
    fillet(fillet_edges, radius=FILLET_R)

    # Fillet001
    fillet001_edges = [fillet001.edges().sort_by_distance(p)[0] for p in [
        (0, -47.126524, -11.126524),
        (-75, 47.126524, -11.126524),
    ]]
    fillet(fillet001_edges, radius=FILLET001_R)


solid = Compound([cylinder002.part, cylinder003.part, fillet001.part])
